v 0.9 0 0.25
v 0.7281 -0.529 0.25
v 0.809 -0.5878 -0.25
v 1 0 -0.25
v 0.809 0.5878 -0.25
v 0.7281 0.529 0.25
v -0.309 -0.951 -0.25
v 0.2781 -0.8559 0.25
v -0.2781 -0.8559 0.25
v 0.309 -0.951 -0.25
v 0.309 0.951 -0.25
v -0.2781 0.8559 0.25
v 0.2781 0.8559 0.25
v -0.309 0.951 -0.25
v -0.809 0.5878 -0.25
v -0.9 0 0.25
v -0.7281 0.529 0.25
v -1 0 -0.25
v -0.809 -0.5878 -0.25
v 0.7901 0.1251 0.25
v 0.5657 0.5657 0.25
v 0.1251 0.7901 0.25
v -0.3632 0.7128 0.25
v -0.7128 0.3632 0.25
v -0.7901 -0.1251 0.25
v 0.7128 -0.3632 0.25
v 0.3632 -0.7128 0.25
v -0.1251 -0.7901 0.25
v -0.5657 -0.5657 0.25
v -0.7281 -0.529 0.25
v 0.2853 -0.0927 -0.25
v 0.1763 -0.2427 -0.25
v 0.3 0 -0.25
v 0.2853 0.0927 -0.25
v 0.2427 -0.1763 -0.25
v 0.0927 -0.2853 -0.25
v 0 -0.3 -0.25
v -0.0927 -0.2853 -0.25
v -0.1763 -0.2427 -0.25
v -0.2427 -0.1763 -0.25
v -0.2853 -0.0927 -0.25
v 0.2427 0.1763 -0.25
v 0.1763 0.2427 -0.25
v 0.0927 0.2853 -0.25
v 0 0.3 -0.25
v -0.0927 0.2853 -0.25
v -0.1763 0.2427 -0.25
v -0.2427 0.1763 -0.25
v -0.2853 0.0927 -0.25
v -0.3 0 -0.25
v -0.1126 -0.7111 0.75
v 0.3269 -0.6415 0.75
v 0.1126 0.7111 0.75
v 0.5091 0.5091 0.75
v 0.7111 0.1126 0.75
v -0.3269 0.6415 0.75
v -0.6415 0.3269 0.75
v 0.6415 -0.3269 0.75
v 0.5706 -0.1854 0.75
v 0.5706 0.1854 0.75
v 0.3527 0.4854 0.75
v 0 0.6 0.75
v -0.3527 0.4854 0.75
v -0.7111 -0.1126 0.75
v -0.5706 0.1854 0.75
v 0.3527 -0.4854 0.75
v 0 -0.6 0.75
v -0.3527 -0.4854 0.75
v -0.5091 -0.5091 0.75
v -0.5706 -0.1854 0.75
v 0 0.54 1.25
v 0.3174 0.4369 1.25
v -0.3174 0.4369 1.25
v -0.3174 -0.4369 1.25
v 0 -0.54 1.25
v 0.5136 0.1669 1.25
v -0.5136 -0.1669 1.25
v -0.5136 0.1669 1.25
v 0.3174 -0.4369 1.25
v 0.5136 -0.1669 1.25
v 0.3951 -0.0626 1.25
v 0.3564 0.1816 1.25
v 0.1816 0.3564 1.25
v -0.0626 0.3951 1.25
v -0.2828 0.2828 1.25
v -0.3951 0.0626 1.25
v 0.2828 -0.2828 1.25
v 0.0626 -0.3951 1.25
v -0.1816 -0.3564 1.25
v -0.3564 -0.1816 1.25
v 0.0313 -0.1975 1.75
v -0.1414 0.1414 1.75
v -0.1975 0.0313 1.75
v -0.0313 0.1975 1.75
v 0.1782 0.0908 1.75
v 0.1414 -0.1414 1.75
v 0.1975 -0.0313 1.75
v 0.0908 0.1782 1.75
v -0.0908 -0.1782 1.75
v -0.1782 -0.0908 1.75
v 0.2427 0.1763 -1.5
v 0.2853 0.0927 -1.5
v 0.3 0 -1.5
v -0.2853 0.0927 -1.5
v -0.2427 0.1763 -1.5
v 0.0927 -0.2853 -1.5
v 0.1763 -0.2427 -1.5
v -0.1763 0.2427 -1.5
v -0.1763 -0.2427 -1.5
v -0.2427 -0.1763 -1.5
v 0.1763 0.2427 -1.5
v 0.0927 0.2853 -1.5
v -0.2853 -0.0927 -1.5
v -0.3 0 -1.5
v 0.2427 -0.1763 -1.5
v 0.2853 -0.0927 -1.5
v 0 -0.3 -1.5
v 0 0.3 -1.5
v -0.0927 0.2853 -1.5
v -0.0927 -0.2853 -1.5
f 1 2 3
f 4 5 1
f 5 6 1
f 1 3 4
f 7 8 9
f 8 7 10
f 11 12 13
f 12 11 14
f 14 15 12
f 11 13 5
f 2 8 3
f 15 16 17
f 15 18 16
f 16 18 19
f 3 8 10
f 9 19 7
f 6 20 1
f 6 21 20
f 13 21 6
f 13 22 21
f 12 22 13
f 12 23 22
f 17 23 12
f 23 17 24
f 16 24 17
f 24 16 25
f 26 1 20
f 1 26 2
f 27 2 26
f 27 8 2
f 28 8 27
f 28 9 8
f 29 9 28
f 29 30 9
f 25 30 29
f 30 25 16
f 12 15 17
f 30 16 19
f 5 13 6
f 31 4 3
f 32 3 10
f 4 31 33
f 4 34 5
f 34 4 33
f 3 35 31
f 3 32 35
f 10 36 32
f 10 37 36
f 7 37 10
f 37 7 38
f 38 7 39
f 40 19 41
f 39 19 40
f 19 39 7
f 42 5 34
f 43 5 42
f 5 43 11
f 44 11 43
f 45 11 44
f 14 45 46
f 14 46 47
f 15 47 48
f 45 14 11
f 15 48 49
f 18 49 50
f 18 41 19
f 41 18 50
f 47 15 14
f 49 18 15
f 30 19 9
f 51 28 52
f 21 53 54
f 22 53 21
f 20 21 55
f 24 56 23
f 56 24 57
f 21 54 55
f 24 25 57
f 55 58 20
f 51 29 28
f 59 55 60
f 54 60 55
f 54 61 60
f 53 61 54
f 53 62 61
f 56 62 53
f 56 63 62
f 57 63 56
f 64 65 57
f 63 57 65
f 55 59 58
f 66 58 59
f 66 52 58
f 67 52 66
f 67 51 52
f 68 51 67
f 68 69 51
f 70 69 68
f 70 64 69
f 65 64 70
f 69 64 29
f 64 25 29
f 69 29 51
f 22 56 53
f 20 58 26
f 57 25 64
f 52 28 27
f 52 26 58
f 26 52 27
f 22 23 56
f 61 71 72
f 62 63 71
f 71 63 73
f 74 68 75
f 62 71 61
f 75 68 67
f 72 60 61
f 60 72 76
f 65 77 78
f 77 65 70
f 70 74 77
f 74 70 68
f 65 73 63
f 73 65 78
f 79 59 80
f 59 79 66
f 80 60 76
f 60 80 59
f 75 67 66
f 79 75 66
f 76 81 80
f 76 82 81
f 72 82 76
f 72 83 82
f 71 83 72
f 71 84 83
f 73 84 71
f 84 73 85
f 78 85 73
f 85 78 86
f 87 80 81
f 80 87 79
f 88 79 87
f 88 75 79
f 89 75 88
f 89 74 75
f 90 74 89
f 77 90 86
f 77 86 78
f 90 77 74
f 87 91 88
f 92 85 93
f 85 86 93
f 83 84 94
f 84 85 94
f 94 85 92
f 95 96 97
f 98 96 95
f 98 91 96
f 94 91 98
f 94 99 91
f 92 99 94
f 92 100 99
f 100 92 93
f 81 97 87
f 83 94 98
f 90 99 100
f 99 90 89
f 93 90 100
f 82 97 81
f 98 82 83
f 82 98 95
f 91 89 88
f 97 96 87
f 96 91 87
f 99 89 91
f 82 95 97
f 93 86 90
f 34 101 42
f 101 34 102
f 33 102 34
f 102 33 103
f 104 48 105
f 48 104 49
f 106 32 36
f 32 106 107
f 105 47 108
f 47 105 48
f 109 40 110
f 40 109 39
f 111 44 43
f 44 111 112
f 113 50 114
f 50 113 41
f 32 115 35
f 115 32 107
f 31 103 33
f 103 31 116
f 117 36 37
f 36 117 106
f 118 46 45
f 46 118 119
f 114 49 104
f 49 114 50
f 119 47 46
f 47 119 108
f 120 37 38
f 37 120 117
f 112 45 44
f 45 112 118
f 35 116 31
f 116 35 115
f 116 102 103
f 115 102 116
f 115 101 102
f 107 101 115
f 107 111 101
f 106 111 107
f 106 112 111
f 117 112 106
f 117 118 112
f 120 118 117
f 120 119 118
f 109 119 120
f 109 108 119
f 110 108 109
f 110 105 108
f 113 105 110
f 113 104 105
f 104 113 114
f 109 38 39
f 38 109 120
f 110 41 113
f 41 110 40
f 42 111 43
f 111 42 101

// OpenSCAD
module tree_01(){

    module regular_polygon(order = 6, r=1){
         angles=[ for (i = [0:order-1]) i*(360/order) ];
         coords=[ for (th=angles) [r*cos(th), r*sin(th)] ];
         polygon(coords);
    }
    
    color("green"){
    linear_extrude(height= 0.5, center = true, scale = 0.9) 
    regular_polygon(order = 10);
    
    translate([0,0,0.5])
    rotate([0,0,45])
    linear_extrude(height= 0.5, center = true, scale = 0.9)  
    regular_polygon(order = 10, r = 0.8);
    
    
    translate([0,0,1])
    rotate([0,0,90])
    linear_extrude(height= 0.5, center = true, scale = 0.9) 
    regular_polygon(order = 10, r = 0.6);
    
        
    translate([0,0,1.5])
    rotate([0,0,135])
    linear_extrude(height= 0.5, center = true, scale = 0.5) 
    regular_polygon(order = 10, r = 0.4);
    }
    
    color("#da6d42")
    translate([0,0,-1.5])
    cylinder(2,0.3,0.3, $fn = 20);
       
}     

tree_01();
